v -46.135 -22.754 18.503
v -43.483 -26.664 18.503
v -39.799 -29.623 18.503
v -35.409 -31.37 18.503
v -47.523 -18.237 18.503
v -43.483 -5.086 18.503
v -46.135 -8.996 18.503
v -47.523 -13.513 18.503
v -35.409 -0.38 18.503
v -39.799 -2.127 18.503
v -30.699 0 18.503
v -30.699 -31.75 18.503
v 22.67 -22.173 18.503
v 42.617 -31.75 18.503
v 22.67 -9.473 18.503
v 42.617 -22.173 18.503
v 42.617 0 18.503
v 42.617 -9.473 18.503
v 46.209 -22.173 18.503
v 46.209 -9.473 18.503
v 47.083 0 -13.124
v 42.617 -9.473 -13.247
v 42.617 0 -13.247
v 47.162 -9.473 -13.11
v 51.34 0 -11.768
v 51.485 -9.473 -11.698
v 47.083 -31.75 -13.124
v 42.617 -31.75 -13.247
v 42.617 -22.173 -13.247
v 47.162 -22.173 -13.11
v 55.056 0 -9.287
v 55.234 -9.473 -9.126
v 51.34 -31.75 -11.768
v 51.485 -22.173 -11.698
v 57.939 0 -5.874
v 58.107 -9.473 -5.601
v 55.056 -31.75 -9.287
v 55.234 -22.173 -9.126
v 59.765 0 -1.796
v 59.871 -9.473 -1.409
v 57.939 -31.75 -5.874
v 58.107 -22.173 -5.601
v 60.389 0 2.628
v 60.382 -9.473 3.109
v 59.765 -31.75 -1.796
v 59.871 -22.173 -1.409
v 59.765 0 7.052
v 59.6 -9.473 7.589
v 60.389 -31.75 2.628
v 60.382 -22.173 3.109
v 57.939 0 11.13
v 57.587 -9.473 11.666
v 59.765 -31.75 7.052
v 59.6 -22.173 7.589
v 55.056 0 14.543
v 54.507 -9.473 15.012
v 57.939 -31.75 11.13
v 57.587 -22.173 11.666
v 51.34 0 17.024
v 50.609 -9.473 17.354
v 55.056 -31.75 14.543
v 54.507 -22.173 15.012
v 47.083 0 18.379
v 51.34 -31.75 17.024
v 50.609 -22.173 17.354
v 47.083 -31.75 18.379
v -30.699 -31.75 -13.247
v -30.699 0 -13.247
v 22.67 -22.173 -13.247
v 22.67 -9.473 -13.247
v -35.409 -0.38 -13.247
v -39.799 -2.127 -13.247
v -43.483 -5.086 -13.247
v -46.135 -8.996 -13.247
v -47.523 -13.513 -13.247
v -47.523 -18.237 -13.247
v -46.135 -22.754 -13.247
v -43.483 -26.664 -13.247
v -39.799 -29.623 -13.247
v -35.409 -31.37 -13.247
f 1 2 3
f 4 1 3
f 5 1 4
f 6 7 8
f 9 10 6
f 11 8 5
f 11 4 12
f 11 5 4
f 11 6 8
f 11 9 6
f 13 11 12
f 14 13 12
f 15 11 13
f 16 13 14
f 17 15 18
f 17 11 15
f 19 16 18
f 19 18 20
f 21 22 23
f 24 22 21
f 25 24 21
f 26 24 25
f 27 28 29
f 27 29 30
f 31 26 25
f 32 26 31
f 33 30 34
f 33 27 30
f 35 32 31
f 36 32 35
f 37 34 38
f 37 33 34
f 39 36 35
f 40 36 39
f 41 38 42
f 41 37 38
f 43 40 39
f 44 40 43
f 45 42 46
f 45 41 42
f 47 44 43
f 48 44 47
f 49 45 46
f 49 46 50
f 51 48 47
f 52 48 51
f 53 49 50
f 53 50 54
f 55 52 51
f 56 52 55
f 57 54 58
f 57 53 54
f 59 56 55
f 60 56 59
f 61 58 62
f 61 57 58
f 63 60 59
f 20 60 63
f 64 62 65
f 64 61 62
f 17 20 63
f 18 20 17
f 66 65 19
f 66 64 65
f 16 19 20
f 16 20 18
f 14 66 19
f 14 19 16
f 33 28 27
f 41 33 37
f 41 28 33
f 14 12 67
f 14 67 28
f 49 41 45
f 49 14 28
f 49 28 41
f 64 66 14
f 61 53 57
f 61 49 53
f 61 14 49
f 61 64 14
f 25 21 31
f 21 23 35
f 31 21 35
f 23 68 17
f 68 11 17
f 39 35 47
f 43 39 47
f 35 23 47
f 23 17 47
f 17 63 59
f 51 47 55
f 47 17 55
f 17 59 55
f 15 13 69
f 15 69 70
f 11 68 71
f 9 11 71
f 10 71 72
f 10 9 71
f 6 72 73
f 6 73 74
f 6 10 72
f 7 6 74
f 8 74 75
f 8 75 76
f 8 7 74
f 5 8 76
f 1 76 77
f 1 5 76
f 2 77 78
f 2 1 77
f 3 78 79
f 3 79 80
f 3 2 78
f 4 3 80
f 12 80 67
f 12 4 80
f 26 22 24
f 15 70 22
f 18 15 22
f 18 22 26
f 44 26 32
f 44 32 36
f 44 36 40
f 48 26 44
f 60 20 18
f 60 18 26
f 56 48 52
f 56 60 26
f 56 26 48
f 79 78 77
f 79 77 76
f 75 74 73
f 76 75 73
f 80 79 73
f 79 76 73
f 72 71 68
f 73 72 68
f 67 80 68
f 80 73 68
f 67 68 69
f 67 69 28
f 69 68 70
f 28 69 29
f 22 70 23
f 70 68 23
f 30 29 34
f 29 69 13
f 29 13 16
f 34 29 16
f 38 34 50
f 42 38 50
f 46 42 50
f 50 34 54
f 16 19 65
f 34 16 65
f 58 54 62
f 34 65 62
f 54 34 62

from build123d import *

# Parameters (mm, degrees)
F0_W     = 76.2
F0_H     = 31.75
F1_DEPTH = 31.75
F2_R     = 15.976301
F3_DEPTH = 31.75
F4_R     = 15.912234
F5_DEPTH = 31.75
F6_W     = 38.1
F6_H     = 12.7
F7_DEPTH = 31.852301


with BuildPart() as f1:
    # F0 (on Front) → F1 (new body)
    with BuildSketch(Plane.XZ):
        with Locations((6.312966, 2.627858)):
            Rectangle(F0_W, F0_H)
    extrude(amount=F1_DEPTH)

    # F2 (on face) → F3 (join)
    with BuildSketch(Plane.XZ.offset(31.75)):
        with Locations((44.412966, 2.627858)):
            Circle(F2_R)
    extrude(amount=-F3_DEPTH)

    # F4 (on face) → F5 (join)
    with BuildSketch(Plane.XY.offset(18.502858)):
        with Locations((-31.787034, -15.875)):
            Circle(F4_R)
    extrude(amount=-F5_DEPTH)

    # F6 (on face) → F7 (cut, through all)
    with BuildSketch(Plane.XY.offset(18.502858)):
        with Locations((41.720474, -15.823372)):
            Rectangle(F6_W, F6_H)
    extrude(amount=-F7_DEPTH, mode=Mode.SUBTRACT)


solid = f1.part
